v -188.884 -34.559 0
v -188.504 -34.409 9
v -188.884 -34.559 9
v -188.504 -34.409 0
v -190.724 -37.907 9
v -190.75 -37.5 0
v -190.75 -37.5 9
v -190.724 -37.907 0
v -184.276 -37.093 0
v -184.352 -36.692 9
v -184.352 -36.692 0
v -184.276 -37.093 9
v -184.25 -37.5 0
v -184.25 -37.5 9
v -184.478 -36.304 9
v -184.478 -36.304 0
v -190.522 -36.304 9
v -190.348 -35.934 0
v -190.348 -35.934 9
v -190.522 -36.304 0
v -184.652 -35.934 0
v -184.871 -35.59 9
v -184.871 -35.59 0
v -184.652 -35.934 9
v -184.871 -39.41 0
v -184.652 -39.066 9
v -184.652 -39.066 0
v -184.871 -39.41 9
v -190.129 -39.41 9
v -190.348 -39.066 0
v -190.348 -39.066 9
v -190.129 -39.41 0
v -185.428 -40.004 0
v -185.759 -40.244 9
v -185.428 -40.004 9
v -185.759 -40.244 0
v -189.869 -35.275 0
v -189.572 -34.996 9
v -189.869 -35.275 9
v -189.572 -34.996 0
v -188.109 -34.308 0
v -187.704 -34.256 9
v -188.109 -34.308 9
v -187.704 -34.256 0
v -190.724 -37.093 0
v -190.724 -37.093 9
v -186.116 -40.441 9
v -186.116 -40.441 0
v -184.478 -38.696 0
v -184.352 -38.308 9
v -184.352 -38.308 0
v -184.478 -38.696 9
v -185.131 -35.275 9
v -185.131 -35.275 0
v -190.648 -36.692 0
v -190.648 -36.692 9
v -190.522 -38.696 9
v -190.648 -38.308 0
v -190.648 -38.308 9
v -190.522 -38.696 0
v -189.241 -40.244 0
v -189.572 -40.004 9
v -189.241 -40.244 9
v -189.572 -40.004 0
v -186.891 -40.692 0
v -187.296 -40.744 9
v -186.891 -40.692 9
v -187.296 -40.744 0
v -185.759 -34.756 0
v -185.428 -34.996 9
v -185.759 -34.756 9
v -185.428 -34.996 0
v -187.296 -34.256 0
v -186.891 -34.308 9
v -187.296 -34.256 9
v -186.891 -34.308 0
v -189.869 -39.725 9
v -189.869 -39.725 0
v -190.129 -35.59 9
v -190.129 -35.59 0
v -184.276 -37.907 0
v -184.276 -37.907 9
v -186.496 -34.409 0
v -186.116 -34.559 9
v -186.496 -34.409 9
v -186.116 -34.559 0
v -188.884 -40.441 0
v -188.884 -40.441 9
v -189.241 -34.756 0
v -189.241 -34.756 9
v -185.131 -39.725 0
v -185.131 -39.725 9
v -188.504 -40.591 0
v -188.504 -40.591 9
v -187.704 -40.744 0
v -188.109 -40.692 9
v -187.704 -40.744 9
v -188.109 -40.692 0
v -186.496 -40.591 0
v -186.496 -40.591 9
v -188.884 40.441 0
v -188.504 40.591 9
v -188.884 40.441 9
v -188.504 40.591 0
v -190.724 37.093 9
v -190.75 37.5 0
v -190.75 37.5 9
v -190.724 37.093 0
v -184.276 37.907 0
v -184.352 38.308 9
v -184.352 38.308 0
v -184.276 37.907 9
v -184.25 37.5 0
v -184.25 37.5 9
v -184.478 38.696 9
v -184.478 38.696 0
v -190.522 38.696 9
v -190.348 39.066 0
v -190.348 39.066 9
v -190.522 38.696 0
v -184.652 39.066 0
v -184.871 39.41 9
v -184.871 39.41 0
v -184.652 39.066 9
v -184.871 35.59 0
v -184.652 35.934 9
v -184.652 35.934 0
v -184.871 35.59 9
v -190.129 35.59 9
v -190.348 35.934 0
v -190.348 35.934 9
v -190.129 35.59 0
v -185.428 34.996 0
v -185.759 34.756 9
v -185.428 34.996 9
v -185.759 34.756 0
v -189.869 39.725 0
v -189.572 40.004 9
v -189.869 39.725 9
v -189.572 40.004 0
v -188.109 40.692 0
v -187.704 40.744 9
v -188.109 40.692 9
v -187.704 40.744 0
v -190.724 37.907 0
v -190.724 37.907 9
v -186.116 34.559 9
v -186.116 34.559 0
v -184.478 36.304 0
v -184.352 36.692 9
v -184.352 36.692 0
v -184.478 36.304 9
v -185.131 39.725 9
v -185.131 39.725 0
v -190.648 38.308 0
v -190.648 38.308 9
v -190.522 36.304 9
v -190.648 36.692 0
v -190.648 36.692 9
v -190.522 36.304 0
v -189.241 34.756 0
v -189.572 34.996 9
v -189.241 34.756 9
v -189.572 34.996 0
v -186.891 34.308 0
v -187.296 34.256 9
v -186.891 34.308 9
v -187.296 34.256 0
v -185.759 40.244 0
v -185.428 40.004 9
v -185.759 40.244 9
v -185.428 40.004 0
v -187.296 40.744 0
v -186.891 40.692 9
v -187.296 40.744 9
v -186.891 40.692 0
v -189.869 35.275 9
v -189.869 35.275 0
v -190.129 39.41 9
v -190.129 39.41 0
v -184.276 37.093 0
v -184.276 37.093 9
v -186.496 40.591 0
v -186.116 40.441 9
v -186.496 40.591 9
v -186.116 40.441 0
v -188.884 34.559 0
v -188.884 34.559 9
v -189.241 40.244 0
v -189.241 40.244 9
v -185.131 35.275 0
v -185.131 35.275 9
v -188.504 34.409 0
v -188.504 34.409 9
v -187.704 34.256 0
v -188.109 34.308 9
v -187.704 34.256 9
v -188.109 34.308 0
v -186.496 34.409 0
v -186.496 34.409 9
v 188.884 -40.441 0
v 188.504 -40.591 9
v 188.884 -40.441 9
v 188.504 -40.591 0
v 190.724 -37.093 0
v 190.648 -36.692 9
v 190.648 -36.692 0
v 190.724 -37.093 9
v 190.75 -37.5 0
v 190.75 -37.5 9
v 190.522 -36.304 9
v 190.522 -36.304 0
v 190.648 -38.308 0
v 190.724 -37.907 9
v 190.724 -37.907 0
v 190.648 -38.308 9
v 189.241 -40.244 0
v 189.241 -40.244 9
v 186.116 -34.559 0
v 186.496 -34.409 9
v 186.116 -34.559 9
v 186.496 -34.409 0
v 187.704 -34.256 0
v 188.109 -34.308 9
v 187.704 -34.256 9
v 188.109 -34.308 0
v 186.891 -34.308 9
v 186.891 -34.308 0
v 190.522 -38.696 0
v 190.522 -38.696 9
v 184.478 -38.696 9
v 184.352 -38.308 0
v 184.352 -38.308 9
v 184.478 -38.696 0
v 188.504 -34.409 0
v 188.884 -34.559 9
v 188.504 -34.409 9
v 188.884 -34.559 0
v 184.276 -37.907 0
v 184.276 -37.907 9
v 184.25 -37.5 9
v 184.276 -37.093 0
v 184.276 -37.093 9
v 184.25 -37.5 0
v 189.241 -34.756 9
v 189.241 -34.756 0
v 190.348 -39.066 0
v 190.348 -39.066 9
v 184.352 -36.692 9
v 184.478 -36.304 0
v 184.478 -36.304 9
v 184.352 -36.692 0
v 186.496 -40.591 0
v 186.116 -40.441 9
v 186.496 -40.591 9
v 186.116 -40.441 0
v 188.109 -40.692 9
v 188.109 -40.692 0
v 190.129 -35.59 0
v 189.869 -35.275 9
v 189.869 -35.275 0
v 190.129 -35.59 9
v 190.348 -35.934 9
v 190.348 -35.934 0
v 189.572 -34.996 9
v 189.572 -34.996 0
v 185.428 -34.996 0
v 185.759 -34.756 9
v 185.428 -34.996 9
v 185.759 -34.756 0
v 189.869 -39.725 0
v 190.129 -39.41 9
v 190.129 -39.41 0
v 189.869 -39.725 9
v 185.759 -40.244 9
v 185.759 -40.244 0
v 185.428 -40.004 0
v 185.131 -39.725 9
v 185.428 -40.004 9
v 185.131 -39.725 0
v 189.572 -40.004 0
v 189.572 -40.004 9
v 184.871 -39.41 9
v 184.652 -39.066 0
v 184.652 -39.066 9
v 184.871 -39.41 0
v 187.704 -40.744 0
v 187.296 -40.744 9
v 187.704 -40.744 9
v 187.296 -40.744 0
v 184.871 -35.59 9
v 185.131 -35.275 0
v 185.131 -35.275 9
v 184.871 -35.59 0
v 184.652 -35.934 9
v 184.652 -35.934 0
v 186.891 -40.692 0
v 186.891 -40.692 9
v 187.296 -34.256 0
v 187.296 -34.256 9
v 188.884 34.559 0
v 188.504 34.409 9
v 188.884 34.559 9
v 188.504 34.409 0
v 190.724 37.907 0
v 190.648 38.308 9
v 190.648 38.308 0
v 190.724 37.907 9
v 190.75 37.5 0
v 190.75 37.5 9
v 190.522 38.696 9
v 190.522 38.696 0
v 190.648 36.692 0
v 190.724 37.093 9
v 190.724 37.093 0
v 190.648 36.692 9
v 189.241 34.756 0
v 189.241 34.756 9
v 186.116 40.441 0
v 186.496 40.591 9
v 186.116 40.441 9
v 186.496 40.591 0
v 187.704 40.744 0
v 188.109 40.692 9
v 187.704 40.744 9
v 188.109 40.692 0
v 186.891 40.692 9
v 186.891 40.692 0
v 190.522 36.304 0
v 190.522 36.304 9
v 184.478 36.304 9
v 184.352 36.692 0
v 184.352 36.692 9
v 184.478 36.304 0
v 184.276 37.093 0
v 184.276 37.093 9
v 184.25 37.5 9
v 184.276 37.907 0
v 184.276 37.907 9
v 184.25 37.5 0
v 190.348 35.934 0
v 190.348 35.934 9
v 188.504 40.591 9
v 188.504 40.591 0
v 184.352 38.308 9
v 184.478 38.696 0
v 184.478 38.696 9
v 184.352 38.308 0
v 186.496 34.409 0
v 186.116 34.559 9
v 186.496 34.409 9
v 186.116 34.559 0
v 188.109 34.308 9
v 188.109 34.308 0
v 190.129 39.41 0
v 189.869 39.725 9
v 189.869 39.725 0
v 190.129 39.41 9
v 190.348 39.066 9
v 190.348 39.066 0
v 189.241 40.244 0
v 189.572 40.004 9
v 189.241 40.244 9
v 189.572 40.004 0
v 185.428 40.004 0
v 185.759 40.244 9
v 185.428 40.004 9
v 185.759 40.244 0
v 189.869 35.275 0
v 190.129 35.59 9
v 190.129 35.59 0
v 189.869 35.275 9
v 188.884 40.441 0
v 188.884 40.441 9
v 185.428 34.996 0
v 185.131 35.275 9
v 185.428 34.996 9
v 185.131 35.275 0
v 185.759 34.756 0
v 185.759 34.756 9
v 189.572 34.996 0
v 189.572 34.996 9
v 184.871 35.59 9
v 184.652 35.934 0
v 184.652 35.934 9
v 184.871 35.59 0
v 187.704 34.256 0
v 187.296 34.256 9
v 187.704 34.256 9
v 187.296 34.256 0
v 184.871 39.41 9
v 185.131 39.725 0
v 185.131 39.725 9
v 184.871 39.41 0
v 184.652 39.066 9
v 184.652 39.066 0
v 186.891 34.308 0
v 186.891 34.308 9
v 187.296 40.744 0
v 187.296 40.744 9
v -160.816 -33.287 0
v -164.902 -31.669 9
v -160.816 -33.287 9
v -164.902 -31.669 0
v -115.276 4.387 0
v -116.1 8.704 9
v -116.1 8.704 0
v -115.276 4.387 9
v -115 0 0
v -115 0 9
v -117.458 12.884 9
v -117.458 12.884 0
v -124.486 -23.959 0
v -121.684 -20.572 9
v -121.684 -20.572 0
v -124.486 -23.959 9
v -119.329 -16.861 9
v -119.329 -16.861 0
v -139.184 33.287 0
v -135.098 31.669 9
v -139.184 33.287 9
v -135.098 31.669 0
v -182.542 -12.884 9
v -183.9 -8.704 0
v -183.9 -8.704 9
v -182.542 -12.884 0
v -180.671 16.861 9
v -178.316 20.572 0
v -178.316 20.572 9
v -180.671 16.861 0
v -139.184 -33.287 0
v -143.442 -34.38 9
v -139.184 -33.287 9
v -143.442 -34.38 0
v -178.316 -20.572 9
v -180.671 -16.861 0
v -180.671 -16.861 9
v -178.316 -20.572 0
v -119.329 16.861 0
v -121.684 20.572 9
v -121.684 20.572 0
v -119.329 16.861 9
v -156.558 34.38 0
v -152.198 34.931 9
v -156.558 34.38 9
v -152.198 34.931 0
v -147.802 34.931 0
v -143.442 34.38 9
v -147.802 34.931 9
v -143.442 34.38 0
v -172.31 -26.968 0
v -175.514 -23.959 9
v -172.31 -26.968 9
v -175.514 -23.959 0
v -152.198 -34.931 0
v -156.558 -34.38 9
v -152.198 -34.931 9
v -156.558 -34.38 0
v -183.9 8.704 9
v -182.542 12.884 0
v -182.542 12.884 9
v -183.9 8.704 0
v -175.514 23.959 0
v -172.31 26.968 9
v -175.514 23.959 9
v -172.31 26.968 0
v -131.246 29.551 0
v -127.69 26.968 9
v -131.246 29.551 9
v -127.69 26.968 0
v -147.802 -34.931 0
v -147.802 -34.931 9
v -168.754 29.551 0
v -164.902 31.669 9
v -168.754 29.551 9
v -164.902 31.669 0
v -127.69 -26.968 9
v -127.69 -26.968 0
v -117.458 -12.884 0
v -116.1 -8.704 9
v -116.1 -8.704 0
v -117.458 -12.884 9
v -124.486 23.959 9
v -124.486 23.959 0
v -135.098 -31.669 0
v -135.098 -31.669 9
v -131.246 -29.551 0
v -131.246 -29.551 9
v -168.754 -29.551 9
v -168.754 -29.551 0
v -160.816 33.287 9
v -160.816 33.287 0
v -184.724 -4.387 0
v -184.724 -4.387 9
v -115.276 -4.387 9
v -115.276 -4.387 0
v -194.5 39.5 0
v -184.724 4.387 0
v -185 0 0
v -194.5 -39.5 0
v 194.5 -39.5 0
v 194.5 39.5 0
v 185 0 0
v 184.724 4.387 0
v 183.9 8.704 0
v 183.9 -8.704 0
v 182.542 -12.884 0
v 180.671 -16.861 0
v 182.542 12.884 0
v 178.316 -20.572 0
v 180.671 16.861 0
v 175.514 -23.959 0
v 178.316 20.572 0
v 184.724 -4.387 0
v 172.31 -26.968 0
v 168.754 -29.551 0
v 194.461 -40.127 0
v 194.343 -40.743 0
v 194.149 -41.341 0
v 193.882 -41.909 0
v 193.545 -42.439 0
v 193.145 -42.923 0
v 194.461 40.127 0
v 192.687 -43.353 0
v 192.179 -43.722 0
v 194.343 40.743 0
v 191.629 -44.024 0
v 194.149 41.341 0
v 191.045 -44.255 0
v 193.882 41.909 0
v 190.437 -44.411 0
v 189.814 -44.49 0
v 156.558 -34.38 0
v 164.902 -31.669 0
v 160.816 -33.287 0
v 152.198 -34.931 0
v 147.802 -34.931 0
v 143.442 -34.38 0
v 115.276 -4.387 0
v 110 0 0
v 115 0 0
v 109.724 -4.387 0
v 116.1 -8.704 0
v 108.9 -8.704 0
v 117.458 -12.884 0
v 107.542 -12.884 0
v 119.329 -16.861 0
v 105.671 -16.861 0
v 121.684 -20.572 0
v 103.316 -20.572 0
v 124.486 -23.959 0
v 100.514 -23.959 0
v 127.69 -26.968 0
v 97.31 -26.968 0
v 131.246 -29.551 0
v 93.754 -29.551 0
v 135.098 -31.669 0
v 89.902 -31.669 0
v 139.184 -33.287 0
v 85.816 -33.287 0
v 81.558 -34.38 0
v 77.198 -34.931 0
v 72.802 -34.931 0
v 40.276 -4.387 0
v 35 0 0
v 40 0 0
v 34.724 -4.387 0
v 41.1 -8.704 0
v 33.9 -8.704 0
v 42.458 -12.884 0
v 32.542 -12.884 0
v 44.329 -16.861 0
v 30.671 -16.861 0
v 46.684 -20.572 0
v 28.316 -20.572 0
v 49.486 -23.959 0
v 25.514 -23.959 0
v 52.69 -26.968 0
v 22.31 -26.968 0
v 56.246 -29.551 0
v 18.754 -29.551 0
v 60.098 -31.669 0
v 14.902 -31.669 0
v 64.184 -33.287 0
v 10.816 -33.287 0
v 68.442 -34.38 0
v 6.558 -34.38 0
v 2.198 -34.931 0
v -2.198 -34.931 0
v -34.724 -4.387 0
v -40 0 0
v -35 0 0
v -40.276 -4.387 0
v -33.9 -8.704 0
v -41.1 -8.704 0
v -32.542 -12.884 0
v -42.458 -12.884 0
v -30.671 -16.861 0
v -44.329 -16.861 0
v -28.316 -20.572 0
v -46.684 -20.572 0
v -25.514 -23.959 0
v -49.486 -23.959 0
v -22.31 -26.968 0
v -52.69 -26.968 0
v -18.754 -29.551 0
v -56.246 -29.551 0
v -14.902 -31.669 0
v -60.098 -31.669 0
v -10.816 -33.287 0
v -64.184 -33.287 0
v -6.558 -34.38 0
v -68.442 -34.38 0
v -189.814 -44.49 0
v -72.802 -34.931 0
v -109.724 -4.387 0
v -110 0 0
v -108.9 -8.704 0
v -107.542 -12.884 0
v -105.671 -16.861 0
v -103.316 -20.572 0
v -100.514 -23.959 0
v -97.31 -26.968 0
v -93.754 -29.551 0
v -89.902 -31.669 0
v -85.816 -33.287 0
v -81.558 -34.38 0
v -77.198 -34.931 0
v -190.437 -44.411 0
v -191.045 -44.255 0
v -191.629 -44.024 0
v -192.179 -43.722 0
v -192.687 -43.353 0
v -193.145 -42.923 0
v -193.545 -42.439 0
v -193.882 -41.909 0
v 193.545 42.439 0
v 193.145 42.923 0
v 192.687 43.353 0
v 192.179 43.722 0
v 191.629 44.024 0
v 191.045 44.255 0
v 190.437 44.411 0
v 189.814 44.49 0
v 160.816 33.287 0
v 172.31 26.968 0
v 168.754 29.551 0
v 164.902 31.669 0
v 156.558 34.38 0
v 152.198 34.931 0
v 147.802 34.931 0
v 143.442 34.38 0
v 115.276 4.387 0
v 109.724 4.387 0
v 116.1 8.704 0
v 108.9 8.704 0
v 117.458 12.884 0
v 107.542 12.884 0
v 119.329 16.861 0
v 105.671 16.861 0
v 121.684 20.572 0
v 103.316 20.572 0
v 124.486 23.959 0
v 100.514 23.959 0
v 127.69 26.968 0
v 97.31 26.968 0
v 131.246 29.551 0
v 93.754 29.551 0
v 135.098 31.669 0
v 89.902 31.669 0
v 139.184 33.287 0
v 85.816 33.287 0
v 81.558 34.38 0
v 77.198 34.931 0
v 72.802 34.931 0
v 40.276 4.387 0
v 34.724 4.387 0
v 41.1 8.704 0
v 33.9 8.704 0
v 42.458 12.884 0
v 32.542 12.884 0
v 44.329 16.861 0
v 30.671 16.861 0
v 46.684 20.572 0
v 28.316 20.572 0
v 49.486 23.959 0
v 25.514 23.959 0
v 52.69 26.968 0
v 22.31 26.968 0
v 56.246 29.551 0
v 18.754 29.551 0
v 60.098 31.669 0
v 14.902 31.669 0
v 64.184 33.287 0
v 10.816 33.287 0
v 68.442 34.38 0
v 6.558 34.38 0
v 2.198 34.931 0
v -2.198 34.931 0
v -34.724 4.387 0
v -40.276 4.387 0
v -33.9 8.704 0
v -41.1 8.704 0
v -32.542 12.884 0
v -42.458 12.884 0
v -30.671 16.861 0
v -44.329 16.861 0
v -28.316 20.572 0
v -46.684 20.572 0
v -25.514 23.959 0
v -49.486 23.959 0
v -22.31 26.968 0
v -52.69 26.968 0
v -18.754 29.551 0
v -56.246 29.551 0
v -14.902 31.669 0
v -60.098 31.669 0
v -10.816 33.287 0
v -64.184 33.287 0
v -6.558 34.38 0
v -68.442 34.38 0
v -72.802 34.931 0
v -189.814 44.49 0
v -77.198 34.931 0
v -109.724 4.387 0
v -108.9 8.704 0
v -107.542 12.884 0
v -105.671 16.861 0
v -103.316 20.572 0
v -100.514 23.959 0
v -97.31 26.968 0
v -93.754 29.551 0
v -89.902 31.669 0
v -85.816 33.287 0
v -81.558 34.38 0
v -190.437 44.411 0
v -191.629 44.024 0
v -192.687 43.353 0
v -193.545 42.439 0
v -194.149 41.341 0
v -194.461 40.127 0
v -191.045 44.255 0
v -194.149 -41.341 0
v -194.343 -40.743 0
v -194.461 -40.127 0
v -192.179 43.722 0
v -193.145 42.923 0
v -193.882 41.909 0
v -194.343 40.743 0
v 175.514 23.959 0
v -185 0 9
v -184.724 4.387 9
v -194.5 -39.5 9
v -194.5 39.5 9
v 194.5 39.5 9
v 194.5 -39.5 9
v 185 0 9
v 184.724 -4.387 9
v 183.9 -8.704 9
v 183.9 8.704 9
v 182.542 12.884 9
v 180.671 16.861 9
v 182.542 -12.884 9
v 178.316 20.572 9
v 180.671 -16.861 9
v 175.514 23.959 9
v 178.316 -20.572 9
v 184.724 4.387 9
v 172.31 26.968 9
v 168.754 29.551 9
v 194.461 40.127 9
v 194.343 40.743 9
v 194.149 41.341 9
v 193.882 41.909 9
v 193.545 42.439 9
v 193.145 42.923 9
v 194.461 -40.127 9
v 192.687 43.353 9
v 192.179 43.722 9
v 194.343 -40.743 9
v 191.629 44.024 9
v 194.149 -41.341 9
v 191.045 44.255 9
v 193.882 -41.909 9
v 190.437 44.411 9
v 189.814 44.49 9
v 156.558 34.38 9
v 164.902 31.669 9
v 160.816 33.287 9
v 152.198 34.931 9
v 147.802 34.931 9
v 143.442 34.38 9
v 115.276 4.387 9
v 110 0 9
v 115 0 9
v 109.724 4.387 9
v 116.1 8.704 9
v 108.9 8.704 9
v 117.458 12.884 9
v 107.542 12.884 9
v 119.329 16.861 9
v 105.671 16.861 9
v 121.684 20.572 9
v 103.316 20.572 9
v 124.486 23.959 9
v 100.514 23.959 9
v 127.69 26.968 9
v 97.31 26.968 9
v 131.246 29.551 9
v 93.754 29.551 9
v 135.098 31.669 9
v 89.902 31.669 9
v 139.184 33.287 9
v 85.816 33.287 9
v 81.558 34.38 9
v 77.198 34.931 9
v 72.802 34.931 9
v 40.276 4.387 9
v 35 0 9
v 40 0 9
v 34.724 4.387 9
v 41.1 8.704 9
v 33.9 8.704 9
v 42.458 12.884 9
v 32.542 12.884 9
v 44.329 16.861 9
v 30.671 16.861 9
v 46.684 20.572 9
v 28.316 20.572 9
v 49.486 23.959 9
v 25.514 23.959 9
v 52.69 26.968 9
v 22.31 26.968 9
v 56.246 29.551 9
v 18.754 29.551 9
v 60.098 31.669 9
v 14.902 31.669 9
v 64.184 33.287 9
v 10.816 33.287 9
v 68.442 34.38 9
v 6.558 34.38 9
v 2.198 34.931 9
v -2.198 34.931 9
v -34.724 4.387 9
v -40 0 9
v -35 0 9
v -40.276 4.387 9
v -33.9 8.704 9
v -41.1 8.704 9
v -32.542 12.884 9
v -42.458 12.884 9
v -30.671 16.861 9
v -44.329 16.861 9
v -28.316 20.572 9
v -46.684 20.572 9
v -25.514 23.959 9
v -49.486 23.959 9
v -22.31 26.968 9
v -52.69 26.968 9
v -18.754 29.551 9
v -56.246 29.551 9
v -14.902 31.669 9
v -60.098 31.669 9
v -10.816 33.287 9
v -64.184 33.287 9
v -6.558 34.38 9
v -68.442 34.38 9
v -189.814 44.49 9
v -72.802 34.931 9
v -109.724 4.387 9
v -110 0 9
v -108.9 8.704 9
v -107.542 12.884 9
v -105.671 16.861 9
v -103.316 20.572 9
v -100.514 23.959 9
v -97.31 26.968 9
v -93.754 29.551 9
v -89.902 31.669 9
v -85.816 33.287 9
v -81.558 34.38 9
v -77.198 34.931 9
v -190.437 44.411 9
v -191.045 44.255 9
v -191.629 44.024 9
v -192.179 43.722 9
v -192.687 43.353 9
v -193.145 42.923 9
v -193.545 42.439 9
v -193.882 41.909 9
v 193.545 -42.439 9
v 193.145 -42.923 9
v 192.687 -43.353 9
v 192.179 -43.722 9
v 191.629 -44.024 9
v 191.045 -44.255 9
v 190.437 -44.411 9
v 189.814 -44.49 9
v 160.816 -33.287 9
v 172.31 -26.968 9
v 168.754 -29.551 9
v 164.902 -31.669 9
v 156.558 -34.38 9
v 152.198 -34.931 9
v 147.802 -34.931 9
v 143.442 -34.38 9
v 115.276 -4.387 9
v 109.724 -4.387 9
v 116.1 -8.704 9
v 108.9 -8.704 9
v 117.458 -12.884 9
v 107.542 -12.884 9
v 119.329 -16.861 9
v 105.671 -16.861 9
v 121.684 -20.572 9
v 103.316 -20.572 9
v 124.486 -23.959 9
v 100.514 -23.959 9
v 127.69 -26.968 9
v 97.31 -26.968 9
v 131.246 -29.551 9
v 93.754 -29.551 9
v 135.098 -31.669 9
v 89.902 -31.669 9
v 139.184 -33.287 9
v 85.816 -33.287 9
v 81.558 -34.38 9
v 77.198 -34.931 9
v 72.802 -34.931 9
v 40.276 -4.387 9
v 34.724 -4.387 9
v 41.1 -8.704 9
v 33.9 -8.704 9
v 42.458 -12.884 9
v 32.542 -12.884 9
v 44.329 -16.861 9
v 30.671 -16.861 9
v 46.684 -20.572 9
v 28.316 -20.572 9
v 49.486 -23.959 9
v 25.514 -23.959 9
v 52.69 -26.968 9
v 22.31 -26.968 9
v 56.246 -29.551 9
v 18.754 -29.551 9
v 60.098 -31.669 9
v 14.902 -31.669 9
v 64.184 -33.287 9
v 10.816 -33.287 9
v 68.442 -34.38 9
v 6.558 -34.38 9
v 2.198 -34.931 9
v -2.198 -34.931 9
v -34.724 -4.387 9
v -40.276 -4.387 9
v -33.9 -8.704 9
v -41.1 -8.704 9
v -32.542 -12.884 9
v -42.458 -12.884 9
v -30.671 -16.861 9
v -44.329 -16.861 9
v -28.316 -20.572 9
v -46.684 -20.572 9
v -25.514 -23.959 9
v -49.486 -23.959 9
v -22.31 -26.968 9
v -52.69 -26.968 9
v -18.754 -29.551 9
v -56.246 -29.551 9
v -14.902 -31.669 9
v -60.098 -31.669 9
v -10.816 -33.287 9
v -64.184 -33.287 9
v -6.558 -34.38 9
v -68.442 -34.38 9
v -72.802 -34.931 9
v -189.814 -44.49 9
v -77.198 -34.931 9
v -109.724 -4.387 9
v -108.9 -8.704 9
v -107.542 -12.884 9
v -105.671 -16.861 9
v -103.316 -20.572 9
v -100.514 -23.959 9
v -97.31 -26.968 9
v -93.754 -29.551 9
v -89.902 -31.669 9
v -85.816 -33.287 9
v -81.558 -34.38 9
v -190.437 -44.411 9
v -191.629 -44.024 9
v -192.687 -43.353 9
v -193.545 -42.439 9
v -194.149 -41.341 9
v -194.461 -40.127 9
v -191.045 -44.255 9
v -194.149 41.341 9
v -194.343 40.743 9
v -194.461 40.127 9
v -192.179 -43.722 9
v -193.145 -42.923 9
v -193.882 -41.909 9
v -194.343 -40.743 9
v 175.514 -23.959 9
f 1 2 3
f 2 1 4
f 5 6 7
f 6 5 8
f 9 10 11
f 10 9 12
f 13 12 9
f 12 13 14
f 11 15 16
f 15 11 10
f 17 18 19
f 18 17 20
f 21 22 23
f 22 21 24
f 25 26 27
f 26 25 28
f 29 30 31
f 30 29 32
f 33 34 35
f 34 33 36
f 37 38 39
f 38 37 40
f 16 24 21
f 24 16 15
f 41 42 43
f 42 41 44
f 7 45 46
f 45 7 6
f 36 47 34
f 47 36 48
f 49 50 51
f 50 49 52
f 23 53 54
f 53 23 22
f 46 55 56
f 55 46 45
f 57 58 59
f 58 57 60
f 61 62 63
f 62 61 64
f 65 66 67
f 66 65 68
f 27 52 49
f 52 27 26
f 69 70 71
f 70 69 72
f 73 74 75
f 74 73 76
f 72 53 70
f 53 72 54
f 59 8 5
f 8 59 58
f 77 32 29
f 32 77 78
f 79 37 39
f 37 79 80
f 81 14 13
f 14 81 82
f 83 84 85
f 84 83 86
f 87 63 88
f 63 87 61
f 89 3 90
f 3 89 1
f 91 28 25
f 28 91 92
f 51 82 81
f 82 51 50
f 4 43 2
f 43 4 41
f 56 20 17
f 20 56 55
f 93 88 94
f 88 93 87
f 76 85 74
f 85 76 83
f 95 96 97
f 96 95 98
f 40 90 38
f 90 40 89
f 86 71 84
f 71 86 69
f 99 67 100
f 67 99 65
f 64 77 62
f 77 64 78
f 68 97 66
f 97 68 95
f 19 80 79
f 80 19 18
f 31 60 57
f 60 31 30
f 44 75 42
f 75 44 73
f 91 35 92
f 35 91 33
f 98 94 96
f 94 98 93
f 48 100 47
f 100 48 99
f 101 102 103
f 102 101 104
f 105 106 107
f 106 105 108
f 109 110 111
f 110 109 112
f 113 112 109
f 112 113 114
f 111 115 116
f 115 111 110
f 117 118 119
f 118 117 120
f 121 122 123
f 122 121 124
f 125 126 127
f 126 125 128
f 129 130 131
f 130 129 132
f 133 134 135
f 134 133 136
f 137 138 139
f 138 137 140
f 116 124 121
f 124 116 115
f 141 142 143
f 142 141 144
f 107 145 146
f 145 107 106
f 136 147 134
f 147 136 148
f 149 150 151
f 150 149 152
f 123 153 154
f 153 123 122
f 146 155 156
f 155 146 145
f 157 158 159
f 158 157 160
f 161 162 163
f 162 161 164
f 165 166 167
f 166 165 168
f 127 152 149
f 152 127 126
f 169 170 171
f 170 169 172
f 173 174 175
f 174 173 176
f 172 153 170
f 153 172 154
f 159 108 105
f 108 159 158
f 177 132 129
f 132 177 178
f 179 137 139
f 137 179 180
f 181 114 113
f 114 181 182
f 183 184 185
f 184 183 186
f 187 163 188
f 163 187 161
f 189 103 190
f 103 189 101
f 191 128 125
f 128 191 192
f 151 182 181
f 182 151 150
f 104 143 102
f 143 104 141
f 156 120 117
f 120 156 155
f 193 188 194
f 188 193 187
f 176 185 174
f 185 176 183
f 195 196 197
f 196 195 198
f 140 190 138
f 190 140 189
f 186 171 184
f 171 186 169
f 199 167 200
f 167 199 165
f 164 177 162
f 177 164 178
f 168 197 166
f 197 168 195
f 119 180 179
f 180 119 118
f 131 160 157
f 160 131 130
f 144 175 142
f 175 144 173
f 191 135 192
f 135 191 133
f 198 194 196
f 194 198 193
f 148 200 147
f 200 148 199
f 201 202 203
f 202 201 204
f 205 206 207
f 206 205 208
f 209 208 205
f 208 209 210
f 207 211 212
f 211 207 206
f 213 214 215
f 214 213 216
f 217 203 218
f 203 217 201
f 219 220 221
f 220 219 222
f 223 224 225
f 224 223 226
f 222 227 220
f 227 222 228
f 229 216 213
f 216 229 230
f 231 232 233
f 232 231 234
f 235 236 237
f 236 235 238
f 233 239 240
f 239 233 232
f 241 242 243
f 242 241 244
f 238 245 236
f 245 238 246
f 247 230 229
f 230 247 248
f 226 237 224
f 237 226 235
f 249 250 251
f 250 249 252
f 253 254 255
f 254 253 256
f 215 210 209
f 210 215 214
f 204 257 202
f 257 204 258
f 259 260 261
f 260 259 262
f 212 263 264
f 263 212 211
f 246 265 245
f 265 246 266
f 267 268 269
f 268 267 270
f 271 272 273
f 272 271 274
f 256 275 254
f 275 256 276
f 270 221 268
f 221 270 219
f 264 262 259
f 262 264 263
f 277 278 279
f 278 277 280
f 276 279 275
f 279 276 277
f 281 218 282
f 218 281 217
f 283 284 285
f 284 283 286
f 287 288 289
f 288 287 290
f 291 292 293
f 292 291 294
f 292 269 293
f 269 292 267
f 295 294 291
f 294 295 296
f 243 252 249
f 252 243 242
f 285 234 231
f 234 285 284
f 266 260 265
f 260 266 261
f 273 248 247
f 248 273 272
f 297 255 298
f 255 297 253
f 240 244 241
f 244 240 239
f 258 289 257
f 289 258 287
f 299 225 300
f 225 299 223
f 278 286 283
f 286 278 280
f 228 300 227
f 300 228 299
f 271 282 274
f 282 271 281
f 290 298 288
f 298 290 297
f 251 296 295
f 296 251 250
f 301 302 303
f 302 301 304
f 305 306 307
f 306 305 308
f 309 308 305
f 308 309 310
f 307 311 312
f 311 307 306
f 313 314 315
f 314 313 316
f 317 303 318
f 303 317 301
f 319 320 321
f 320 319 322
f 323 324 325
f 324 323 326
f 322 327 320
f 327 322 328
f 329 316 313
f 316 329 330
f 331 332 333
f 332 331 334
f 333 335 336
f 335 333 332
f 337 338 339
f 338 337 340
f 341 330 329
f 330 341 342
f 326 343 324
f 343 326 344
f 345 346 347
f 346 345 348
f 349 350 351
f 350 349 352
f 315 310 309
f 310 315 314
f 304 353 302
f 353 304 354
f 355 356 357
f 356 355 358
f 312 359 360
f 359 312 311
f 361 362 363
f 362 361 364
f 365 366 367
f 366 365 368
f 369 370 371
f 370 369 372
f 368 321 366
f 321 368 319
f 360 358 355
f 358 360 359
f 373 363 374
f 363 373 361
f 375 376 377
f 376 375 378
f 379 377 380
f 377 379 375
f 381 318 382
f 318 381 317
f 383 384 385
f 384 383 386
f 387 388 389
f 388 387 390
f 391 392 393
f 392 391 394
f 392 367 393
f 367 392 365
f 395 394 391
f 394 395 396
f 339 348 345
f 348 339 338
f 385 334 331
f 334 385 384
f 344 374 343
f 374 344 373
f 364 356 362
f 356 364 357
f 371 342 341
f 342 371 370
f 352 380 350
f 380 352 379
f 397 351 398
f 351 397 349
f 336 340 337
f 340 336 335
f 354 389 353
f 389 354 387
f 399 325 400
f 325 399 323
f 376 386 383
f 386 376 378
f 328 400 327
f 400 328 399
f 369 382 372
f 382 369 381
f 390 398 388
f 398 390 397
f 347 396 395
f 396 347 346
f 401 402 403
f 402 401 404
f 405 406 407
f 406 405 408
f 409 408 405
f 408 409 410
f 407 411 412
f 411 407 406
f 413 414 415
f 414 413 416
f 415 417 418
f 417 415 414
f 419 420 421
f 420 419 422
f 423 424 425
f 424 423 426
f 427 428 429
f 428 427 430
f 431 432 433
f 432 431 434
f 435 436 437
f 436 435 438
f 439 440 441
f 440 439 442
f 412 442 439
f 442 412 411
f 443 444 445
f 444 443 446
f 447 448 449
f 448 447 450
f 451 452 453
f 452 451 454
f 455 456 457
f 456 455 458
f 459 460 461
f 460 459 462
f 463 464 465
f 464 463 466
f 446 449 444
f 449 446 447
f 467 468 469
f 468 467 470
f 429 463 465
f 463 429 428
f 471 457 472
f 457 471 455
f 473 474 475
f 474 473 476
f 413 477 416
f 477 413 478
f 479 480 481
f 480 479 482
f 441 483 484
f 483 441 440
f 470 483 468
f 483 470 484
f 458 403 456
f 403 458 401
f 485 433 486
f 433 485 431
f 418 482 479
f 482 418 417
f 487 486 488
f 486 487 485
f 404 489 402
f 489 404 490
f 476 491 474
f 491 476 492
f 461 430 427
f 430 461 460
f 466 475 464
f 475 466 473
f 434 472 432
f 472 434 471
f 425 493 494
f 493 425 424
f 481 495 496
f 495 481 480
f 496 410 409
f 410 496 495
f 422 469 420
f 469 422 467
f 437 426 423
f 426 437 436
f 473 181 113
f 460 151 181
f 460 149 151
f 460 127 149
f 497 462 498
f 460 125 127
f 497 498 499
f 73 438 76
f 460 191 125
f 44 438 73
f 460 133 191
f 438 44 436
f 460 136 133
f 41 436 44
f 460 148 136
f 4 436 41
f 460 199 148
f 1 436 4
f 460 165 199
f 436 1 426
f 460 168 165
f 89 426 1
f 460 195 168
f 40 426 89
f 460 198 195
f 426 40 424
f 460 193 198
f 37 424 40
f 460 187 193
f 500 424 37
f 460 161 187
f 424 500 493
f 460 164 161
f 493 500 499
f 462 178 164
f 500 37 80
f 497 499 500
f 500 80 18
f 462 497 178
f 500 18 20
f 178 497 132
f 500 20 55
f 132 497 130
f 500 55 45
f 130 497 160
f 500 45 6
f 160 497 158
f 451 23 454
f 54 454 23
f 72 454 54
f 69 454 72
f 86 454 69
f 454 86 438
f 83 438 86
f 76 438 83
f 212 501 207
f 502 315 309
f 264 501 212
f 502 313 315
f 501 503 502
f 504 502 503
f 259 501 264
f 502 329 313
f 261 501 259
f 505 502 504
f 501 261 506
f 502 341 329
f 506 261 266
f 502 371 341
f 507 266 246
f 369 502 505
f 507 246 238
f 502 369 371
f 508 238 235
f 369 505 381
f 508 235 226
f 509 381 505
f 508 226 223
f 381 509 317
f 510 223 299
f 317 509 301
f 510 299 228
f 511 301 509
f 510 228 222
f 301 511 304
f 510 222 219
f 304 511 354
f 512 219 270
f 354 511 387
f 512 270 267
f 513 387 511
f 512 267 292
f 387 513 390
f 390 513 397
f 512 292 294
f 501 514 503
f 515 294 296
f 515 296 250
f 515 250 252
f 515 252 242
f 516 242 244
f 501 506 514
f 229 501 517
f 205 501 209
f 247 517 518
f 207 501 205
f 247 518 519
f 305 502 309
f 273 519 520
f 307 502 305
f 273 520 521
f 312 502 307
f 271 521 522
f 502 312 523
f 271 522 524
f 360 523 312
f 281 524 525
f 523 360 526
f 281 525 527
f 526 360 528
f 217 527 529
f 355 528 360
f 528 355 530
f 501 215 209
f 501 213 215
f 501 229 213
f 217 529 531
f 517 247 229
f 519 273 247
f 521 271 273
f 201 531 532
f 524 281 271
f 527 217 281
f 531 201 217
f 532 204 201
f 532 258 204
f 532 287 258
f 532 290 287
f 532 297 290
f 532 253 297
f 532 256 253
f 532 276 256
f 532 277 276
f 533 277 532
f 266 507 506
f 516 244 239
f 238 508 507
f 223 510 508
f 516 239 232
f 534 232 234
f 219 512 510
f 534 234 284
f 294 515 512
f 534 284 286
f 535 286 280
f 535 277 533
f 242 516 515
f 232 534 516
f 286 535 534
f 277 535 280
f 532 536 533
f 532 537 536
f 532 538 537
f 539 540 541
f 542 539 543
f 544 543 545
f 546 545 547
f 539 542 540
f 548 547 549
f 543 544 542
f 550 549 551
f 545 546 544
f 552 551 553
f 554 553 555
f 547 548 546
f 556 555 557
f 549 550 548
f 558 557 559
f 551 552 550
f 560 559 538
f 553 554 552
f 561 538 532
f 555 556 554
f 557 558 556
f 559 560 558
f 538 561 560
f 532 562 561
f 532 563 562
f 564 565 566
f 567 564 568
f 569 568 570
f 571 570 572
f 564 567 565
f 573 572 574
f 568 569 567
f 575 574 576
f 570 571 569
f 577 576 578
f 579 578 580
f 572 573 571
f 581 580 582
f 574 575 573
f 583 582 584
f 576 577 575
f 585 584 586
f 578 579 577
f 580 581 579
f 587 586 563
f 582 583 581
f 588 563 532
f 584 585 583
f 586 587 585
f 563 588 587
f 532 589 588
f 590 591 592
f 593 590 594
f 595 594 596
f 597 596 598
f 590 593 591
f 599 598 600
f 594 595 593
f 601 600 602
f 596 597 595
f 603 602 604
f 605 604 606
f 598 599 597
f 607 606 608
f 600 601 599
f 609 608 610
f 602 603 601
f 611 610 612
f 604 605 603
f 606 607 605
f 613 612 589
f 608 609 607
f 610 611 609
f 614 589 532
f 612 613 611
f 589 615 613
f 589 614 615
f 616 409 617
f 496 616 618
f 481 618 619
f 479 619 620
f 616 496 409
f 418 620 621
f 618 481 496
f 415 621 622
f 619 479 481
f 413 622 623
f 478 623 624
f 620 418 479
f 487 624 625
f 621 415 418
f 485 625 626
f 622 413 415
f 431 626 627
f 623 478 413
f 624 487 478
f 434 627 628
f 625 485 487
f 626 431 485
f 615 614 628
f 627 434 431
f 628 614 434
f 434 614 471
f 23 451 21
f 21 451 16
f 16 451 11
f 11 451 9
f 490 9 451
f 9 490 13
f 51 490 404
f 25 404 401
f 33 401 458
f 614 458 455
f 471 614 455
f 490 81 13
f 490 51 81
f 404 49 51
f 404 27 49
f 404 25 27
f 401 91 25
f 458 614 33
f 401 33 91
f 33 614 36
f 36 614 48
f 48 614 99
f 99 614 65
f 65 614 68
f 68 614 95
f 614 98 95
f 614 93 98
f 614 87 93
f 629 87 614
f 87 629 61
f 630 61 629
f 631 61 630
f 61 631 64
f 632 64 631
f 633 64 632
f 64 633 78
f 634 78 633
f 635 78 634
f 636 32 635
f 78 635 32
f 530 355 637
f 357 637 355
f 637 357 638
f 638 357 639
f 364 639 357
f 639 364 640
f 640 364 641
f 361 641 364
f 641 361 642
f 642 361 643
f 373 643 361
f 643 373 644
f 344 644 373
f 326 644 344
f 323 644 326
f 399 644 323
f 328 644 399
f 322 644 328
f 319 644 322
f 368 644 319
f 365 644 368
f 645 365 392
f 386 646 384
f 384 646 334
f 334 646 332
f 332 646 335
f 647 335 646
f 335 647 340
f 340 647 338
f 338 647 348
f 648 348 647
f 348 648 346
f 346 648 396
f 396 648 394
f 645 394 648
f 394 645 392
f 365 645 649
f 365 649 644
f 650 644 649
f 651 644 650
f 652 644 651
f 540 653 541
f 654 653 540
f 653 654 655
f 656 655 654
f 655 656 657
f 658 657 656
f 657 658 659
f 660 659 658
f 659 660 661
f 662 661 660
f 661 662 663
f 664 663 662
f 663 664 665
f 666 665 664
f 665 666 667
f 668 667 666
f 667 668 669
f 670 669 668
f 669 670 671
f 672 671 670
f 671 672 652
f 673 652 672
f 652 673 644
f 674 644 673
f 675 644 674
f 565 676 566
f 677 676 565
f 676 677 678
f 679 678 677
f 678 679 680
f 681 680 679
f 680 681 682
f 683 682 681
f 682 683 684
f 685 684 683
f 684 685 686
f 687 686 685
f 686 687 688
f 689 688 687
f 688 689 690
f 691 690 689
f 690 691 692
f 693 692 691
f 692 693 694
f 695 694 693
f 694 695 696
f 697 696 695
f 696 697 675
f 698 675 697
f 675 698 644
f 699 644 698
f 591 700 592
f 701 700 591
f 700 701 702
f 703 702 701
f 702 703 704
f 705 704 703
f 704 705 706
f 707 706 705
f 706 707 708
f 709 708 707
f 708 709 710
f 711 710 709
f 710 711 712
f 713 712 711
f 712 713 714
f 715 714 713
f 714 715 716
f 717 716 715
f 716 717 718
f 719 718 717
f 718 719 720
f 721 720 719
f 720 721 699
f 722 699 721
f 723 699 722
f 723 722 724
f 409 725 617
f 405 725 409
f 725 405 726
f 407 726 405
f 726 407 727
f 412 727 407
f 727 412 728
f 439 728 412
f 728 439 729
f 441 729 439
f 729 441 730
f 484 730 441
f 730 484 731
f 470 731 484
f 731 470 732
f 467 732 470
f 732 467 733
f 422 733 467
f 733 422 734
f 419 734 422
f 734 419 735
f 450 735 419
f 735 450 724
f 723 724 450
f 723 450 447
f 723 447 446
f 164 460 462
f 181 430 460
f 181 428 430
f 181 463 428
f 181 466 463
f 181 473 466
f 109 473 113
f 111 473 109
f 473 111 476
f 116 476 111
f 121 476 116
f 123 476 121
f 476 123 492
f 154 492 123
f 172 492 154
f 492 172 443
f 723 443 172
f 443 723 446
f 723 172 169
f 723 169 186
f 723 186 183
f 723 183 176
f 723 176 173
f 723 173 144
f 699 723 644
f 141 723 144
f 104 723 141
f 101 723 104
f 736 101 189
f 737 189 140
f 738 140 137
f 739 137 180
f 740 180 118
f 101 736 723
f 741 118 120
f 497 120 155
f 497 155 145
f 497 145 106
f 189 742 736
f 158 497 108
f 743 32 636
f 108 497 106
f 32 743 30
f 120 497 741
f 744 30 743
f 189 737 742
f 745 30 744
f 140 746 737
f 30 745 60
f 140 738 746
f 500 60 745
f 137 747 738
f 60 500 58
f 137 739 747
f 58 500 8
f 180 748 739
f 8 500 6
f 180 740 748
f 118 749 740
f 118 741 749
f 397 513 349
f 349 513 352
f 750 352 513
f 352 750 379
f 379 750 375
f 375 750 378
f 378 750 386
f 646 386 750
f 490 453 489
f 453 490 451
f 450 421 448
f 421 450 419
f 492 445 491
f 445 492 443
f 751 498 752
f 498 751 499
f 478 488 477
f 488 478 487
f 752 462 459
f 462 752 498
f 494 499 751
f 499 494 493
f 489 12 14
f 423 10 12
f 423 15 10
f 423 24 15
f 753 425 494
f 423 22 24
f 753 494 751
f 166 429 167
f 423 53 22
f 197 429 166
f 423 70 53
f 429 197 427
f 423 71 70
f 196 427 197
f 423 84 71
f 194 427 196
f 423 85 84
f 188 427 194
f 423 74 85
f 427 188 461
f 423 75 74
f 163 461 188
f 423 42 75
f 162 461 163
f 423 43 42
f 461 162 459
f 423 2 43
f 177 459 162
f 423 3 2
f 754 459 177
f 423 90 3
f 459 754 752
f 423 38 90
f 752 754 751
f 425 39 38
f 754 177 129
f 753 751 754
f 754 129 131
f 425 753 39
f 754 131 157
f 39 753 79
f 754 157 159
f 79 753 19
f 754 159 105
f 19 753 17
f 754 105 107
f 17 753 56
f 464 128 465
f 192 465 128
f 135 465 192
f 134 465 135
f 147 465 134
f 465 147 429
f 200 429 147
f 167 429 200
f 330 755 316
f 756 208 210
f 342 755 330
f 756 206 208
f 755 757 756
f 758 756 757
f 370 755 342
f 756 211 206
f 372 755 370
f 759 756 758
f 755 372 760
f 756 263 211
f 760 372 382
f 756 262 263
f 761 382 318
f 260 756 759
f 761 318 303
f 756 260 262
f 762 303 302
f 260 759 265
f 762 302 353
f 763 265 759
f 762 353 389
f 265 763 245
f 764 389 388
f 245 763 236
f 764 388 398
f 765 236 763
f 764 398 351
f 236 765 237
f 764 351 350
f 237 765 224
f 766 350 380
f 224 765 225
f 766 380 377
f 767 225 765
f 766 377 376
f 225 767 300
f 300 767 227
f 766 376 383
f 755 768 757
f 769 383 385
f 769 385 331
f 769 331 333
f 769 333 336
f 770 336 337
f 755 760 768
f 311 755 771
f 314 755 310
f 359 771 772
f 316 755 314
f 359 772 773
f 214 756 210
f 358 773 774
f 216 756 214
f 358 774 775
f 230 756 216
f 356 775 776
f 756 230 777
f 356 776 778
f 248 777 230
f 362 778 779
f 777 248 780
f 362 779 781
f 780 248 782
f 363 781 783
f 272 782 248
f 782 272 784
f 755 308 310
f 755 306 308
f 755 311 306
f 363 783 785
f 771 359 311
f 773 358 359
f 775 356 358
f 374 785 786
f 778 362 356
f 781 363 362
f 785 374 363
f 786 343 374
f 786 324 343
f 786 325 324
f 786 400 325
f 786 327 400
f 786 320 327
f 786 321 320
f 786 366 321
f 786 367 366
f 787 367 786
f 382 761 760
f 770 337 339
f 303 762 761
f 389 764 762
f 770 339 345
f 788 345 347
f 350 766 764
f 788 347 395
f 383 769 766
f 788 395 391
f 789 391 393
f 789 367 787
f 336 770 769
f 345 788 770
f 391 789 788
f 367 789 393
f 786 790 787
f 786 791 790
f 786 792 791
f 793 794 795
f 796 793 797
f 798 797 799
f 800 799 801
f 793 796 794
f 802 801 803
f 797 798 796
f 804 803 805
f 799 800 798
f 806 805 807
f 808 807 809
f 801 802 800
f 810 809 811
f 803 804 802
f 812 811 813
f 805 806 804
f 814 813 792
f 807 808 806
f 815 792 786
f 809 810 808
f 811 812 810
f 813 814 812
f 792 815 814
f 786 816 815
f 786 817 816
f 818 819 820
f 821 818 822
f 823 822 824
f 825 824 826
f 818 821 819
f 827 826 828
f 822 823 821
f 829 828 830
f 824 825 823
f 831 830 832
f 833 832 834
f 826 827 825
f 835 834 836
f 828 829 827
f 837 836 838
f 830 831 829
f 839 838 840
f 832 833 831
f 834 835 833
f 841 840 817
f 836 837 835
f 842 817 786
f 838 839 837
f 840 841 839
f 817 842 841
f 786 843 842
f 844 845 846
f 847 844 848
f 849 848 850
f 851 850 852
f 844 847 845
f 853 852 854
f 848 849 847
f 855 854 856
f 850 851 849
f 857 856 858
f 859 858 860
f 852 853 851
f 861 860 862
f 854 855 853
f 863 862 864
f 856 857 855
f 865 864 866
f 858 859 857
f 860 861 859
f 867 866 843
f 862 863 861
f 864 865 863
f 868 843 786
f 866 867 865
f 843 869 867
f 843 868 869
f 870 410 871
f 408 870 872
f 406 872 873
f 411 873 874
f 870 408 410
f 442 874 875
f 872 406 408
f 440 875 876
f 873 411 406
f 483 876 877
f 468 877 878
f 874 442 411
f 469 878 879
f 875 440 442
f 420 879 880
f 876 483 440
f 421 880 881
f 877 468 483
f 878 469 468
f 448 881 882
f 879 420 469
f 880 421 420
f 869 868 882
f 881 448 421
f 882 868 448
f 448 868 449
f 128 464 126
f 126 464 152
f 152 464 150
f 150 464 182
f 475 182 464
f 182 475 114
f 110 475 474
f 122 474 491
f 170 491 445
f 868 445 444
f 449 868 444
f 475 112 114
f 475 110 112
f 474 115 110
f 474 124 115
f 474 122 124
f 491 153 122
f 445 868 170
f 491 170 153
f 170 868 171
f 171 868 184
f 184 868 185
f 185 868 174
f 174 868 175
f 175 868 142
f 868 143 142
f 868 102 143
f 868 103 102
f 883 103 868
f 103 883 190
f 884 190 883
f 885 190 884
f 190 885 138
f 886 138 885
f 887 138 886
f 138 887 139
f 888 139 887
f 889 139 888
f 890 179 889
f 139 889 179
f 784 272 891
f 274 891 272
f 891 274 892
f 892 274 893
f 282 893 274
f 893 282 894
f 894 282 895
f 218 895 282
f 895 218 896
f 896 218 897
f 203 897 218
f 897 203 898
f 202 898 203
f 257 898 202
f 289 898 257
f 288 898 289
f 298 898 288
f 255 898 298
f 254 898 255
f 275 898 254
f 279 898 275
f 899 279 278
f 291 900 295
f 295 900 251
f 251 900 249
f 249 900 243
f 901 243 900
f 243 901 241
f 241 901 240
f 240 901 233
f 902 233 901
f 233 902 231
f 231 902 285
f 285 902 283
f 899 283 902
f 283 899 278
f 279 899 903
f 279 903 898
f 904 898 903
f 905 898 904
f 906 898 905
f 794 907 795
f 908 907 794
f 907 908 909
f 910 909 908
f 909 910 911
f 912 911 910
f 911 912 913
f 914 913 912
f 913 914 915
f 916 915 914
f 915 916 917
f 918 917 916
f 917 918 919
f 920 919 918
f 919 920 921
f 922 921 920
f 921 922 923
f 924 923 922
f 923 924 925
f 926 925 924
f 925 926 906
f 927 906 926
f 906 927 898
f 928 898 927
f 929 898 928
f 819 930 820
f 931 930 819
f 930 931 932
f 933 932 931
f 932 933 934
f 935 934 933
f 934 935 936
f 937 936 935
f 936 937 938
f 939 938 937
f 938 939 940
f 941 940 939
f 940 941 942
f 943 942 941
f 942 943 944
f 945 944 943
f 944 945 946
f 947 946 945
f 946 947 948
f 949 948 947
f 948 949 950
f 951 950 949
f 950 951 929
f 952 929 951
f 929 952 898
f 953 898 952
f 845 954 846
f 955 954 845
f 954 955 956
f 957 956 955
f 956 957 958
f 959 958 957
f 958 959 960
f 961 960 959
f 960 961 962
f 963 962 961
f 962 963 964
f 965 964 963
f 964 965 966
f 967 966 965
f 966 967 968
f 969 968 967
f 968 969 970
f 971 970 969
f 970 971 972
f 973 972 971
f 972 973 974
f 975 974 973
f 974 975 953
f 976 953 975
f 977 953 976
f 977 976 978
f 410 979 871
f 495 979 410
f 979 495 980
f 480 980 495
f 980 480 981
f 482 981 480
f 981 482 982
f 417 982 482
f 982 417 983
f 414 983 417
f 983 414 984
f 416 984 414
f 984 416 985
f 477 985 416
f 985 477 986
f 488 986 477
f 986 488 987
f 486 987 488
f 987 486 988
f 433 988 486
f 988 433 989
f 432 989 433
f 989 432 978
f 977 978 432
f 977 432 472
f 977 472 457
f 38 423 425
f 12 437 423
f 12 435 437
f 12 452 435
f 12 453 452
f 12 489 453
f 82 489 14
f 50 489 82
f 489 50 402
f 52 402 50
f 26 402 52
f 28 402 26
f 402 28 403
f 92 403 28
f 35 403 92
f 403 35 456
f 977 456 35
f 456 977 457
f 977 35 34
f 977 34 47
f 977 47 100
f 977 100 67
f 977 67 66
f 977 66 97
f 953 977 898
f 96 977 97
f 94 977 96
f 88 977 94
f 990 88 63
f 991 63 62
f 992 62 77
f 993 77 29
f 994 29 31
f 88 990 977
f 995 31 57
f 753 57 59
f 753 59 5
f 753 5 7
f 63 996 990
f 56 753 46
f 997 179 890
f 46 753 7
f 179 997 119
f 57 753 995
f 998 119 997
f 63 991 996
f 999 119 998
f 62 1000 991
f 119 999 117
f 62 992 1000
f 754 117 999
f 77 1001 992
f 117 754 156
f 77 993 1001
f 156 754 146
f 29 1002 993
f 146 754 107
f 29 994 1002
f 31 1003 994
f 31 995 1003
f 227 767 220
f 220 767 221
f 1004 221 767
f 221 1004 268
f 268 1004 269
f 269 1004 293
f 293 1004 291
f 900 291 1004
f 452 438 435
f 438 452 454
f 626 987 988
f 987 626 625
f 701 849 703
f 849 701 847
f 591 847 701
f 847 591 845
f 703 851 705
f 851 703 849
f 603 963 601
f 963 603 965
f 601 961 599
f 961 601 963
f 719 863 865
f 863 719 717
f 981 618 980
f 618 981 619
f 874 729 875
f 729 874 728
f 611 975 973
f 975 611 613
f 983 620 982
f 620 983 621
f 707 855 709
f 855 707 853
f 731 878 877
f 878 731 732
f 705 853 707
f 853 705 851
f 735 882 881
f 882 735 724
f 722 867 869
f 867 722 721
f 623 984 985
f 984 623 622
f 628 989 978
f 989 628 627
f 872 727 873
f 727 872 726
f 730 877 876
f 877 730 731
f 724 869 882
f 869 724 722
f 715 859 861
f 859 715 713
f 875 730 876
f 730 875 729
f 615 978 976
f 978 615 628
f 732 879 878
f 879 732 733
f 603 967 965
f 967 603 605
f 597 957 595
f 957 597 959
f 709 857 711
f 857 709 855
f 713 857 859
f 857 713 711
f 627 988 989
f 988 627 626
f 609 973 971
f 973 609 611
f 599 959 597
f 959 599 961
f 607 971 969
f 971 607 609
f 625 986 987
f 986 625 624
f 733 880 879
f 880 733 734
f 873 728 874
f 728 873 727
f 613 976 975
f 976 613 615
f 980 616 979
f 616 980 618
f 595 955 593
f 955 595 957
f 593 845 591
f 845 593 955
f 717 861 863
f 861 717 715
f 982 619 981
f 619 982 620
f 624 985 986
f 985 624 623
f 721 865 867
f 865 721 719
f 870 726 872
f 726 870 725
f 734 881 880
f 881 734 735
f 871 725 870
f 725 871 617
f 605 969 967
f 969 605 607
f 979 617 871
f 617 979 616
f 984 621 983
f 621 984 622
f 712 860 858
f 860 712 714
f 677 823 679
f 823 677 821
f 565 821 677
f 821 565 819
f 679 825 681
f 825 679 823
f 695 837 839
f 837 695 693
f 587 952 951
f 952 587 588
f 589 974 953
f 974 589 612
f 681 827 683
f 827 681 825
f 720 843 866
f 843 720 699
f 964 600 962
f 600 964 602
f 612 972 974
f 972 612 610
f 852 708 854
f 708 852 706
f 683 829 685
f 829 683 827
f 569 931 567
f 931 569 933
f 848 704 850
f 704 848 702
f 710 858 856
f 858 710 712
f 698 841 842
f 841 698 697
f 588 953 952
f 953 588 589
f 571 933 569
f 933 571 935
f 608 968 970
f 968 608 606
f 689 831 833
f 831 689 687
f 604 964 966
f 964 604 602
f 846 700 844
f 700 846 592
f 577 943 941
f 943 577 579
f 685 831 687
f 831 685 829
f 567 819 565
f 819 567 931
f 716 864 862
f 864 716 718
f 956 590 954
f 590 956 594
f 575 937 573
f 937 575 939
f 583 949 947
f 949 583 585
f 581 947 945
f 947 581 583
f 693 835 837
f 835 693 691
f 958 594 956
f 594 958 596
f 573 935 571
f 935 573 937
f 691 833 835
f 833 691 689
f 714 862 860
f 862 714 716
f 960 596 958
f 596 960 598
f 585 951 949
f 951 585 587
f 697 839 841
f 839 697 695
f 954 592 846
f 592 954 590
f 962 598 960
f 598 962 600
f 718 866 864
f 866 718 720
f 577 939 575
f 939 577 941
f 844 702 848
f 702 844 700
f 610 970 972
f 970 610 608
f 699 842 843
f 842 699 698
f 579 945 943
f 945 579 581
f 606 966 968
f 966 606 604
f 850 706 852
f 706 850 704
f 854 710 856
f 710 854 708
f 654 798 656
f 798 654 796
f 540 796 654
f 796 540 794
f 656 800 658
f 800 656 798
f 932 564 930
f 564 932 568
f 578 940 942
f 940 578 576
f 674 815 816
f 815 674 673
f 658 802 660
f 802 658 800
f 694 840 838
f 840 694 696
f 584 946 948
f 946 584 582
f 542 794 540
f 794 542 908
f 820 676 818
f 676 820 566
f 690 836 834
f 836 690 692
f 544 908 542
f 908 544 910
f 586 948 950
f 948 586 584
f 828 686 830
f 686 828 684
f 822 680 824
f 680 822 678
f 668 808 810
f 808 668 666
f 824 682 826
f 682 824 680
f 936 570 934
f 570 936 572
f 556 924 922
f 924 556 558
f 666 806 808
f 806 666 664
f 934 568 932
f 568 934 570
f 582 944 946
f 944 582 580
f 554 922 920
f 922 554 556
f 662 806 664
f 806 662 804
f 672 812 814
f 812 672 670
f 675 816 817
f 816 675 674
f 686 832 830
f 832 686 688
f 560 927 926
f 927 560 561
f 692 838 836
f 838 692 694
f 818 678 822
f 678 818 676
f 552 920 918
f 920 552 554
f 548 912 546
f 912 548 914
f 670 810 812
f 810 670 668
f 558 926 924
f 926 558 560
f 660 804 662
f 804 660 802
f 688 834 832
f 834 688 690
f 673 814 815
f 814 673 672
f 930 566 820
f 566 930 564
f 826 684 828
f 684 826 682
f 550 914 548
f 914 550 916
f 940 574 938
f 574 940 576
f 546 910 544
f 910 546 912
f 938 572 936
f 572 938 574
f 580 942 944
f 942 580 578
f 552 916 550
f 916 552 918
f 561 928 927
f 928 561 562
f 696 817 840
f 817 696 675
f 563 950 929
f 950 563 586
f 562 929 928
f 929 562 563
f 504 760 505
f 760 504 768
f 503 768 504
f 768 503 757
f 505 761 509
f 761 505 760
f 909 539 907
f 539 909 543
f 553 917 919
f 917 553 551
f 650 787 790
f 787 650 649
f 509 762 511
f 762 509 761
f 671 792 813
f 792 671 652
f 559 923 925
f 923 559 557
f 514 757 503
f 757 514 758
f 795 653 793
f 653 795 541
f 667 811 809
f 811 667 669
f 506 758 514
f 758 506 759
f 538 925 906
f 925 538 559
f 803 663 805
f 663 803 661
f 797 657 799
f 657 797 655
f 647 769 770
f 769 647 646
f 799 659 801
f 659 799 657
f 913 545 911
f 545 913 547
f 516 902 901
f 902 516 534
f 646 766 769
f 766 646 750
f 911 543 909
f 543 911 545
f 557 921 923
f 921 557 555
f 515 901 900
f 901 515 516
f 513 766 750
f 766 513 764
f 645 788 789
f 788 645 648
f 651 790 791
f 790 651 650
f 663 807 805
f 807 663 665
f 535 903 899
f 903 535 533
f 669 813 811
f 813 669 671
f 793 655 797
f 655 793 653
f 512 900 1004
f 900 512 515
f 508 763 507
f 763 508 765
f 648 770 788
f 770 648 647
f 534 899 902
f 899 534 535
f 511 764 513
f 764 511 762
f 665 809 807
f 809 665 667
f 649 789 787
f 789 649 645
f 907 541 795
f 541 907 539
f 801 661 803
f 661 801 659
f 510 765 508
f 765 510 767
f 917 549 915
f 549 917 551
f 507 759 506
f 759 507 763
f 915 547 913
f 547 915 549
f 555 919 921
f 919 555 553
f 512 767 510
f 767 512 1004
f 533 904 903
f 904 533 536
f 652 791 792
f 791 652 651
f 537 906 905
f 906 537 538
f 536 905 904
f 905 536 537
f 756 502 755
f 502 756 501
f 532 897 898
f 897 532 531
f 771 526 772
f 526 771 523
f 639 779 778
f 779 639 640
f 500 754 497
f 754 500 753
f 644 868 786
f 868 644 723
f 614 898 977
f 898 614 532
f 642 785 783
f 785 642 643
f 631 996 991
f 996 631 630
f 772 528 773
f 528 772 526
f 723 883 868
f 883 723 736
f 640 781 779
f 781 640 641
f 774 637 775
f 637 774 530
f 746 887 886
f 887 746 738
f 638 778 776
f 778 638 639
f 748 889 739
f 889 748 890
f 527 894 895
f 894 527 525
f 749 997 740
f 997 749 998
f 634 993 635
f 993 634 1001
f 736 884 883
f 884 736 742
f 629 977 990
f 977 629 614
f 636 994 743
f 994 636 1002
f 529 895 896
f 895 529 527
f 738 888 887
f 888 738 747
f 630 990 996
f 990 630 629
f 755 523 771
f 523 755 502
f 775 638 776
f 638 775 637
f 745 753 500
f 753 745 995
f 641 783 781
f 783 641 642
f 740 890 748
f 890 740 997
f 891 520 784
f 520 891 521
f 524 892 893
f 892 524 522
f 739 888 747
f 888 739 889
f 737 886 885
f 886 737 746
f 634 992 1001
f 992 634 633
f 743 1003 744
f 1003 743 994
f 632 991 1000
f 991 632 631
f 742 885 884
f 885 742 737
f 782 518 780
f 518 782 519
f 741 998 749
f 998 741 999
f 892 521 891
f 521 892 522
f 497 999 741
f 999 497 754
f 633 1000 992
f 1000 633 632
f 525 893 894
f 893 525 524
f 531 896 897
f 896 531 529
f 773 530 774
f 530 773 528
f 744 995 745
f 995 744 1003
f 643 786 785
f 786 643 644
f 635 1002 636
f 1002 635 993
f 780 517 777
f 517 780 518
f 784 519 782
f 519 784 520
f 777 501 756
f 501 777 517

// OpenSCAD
$fn = 50;

difference() {
	union() {
		hull() {
			translate(v = [-189.5, 39.5, 0]) {
				cylinder(h = 9, r = 5);
			}
			translate(v = [189.5, 39.5, 0]) {
				cylinder(h = 9, r = 5);
			}
			translate(v = [-189.5, -39.5, 0]) {
				cylinder(h = 9, r = 5);
			}
			translate(v = [189.5, -39.5, 0]) {
				cylinder(h = 9, r = 5);
			}
		}
	}
	union() {
		translate(v = [-187.5, -37.5, -100.0]) {
			cylinder(h = 200, r = 3.25);
		}
		translate(v = [-187.5, 37.5, -100.0]) {
			cylinder(h = 200, r = 3.25);
		}
		translate(v = [187.5, -37.5, -100.0]) {
			cylinder(h = 200, r = 3.25);
		}
		translate(v = [187.5, 37.5, -100.0]) {
			cylinder(h = 200, r = 3.25);
		}
		translate(v = [-187.5, -37.5, -100.0]) {
			cylinder(h = 200, r = 1.8);
		}
		translate(v = [-187.5, 37.5, -100.0]) {
			cylinder(h = 200, r = 1.8);
		}
		translate(v = [187.5, -37.5, -100.0]) {
			cylinder(h = 200, r = 1.8);
		}
		translate(v = [187.5, 37.5, -100.0]) {
			cylinder(h = 200, r = 1.8);
		}
		translate(v = [-150.0, 0, 0.0]) {
			cylinder(h = 9, r = 35.0);
		}
		translate(v = [-75.0, 0, 0.0]) {
			cylinder(h = 9, r = 35.0);
		}
		cylinder(h = 9, r = 35.0);
		translate(v = [75.0, 0, 0.0]) {
			cylinder(h = 9, r = 35.0);
		}
		translate(v = [150.0, 0, 0.0]) {
			cylinder(h = 9, r = 35.0);
		}
	}
}
